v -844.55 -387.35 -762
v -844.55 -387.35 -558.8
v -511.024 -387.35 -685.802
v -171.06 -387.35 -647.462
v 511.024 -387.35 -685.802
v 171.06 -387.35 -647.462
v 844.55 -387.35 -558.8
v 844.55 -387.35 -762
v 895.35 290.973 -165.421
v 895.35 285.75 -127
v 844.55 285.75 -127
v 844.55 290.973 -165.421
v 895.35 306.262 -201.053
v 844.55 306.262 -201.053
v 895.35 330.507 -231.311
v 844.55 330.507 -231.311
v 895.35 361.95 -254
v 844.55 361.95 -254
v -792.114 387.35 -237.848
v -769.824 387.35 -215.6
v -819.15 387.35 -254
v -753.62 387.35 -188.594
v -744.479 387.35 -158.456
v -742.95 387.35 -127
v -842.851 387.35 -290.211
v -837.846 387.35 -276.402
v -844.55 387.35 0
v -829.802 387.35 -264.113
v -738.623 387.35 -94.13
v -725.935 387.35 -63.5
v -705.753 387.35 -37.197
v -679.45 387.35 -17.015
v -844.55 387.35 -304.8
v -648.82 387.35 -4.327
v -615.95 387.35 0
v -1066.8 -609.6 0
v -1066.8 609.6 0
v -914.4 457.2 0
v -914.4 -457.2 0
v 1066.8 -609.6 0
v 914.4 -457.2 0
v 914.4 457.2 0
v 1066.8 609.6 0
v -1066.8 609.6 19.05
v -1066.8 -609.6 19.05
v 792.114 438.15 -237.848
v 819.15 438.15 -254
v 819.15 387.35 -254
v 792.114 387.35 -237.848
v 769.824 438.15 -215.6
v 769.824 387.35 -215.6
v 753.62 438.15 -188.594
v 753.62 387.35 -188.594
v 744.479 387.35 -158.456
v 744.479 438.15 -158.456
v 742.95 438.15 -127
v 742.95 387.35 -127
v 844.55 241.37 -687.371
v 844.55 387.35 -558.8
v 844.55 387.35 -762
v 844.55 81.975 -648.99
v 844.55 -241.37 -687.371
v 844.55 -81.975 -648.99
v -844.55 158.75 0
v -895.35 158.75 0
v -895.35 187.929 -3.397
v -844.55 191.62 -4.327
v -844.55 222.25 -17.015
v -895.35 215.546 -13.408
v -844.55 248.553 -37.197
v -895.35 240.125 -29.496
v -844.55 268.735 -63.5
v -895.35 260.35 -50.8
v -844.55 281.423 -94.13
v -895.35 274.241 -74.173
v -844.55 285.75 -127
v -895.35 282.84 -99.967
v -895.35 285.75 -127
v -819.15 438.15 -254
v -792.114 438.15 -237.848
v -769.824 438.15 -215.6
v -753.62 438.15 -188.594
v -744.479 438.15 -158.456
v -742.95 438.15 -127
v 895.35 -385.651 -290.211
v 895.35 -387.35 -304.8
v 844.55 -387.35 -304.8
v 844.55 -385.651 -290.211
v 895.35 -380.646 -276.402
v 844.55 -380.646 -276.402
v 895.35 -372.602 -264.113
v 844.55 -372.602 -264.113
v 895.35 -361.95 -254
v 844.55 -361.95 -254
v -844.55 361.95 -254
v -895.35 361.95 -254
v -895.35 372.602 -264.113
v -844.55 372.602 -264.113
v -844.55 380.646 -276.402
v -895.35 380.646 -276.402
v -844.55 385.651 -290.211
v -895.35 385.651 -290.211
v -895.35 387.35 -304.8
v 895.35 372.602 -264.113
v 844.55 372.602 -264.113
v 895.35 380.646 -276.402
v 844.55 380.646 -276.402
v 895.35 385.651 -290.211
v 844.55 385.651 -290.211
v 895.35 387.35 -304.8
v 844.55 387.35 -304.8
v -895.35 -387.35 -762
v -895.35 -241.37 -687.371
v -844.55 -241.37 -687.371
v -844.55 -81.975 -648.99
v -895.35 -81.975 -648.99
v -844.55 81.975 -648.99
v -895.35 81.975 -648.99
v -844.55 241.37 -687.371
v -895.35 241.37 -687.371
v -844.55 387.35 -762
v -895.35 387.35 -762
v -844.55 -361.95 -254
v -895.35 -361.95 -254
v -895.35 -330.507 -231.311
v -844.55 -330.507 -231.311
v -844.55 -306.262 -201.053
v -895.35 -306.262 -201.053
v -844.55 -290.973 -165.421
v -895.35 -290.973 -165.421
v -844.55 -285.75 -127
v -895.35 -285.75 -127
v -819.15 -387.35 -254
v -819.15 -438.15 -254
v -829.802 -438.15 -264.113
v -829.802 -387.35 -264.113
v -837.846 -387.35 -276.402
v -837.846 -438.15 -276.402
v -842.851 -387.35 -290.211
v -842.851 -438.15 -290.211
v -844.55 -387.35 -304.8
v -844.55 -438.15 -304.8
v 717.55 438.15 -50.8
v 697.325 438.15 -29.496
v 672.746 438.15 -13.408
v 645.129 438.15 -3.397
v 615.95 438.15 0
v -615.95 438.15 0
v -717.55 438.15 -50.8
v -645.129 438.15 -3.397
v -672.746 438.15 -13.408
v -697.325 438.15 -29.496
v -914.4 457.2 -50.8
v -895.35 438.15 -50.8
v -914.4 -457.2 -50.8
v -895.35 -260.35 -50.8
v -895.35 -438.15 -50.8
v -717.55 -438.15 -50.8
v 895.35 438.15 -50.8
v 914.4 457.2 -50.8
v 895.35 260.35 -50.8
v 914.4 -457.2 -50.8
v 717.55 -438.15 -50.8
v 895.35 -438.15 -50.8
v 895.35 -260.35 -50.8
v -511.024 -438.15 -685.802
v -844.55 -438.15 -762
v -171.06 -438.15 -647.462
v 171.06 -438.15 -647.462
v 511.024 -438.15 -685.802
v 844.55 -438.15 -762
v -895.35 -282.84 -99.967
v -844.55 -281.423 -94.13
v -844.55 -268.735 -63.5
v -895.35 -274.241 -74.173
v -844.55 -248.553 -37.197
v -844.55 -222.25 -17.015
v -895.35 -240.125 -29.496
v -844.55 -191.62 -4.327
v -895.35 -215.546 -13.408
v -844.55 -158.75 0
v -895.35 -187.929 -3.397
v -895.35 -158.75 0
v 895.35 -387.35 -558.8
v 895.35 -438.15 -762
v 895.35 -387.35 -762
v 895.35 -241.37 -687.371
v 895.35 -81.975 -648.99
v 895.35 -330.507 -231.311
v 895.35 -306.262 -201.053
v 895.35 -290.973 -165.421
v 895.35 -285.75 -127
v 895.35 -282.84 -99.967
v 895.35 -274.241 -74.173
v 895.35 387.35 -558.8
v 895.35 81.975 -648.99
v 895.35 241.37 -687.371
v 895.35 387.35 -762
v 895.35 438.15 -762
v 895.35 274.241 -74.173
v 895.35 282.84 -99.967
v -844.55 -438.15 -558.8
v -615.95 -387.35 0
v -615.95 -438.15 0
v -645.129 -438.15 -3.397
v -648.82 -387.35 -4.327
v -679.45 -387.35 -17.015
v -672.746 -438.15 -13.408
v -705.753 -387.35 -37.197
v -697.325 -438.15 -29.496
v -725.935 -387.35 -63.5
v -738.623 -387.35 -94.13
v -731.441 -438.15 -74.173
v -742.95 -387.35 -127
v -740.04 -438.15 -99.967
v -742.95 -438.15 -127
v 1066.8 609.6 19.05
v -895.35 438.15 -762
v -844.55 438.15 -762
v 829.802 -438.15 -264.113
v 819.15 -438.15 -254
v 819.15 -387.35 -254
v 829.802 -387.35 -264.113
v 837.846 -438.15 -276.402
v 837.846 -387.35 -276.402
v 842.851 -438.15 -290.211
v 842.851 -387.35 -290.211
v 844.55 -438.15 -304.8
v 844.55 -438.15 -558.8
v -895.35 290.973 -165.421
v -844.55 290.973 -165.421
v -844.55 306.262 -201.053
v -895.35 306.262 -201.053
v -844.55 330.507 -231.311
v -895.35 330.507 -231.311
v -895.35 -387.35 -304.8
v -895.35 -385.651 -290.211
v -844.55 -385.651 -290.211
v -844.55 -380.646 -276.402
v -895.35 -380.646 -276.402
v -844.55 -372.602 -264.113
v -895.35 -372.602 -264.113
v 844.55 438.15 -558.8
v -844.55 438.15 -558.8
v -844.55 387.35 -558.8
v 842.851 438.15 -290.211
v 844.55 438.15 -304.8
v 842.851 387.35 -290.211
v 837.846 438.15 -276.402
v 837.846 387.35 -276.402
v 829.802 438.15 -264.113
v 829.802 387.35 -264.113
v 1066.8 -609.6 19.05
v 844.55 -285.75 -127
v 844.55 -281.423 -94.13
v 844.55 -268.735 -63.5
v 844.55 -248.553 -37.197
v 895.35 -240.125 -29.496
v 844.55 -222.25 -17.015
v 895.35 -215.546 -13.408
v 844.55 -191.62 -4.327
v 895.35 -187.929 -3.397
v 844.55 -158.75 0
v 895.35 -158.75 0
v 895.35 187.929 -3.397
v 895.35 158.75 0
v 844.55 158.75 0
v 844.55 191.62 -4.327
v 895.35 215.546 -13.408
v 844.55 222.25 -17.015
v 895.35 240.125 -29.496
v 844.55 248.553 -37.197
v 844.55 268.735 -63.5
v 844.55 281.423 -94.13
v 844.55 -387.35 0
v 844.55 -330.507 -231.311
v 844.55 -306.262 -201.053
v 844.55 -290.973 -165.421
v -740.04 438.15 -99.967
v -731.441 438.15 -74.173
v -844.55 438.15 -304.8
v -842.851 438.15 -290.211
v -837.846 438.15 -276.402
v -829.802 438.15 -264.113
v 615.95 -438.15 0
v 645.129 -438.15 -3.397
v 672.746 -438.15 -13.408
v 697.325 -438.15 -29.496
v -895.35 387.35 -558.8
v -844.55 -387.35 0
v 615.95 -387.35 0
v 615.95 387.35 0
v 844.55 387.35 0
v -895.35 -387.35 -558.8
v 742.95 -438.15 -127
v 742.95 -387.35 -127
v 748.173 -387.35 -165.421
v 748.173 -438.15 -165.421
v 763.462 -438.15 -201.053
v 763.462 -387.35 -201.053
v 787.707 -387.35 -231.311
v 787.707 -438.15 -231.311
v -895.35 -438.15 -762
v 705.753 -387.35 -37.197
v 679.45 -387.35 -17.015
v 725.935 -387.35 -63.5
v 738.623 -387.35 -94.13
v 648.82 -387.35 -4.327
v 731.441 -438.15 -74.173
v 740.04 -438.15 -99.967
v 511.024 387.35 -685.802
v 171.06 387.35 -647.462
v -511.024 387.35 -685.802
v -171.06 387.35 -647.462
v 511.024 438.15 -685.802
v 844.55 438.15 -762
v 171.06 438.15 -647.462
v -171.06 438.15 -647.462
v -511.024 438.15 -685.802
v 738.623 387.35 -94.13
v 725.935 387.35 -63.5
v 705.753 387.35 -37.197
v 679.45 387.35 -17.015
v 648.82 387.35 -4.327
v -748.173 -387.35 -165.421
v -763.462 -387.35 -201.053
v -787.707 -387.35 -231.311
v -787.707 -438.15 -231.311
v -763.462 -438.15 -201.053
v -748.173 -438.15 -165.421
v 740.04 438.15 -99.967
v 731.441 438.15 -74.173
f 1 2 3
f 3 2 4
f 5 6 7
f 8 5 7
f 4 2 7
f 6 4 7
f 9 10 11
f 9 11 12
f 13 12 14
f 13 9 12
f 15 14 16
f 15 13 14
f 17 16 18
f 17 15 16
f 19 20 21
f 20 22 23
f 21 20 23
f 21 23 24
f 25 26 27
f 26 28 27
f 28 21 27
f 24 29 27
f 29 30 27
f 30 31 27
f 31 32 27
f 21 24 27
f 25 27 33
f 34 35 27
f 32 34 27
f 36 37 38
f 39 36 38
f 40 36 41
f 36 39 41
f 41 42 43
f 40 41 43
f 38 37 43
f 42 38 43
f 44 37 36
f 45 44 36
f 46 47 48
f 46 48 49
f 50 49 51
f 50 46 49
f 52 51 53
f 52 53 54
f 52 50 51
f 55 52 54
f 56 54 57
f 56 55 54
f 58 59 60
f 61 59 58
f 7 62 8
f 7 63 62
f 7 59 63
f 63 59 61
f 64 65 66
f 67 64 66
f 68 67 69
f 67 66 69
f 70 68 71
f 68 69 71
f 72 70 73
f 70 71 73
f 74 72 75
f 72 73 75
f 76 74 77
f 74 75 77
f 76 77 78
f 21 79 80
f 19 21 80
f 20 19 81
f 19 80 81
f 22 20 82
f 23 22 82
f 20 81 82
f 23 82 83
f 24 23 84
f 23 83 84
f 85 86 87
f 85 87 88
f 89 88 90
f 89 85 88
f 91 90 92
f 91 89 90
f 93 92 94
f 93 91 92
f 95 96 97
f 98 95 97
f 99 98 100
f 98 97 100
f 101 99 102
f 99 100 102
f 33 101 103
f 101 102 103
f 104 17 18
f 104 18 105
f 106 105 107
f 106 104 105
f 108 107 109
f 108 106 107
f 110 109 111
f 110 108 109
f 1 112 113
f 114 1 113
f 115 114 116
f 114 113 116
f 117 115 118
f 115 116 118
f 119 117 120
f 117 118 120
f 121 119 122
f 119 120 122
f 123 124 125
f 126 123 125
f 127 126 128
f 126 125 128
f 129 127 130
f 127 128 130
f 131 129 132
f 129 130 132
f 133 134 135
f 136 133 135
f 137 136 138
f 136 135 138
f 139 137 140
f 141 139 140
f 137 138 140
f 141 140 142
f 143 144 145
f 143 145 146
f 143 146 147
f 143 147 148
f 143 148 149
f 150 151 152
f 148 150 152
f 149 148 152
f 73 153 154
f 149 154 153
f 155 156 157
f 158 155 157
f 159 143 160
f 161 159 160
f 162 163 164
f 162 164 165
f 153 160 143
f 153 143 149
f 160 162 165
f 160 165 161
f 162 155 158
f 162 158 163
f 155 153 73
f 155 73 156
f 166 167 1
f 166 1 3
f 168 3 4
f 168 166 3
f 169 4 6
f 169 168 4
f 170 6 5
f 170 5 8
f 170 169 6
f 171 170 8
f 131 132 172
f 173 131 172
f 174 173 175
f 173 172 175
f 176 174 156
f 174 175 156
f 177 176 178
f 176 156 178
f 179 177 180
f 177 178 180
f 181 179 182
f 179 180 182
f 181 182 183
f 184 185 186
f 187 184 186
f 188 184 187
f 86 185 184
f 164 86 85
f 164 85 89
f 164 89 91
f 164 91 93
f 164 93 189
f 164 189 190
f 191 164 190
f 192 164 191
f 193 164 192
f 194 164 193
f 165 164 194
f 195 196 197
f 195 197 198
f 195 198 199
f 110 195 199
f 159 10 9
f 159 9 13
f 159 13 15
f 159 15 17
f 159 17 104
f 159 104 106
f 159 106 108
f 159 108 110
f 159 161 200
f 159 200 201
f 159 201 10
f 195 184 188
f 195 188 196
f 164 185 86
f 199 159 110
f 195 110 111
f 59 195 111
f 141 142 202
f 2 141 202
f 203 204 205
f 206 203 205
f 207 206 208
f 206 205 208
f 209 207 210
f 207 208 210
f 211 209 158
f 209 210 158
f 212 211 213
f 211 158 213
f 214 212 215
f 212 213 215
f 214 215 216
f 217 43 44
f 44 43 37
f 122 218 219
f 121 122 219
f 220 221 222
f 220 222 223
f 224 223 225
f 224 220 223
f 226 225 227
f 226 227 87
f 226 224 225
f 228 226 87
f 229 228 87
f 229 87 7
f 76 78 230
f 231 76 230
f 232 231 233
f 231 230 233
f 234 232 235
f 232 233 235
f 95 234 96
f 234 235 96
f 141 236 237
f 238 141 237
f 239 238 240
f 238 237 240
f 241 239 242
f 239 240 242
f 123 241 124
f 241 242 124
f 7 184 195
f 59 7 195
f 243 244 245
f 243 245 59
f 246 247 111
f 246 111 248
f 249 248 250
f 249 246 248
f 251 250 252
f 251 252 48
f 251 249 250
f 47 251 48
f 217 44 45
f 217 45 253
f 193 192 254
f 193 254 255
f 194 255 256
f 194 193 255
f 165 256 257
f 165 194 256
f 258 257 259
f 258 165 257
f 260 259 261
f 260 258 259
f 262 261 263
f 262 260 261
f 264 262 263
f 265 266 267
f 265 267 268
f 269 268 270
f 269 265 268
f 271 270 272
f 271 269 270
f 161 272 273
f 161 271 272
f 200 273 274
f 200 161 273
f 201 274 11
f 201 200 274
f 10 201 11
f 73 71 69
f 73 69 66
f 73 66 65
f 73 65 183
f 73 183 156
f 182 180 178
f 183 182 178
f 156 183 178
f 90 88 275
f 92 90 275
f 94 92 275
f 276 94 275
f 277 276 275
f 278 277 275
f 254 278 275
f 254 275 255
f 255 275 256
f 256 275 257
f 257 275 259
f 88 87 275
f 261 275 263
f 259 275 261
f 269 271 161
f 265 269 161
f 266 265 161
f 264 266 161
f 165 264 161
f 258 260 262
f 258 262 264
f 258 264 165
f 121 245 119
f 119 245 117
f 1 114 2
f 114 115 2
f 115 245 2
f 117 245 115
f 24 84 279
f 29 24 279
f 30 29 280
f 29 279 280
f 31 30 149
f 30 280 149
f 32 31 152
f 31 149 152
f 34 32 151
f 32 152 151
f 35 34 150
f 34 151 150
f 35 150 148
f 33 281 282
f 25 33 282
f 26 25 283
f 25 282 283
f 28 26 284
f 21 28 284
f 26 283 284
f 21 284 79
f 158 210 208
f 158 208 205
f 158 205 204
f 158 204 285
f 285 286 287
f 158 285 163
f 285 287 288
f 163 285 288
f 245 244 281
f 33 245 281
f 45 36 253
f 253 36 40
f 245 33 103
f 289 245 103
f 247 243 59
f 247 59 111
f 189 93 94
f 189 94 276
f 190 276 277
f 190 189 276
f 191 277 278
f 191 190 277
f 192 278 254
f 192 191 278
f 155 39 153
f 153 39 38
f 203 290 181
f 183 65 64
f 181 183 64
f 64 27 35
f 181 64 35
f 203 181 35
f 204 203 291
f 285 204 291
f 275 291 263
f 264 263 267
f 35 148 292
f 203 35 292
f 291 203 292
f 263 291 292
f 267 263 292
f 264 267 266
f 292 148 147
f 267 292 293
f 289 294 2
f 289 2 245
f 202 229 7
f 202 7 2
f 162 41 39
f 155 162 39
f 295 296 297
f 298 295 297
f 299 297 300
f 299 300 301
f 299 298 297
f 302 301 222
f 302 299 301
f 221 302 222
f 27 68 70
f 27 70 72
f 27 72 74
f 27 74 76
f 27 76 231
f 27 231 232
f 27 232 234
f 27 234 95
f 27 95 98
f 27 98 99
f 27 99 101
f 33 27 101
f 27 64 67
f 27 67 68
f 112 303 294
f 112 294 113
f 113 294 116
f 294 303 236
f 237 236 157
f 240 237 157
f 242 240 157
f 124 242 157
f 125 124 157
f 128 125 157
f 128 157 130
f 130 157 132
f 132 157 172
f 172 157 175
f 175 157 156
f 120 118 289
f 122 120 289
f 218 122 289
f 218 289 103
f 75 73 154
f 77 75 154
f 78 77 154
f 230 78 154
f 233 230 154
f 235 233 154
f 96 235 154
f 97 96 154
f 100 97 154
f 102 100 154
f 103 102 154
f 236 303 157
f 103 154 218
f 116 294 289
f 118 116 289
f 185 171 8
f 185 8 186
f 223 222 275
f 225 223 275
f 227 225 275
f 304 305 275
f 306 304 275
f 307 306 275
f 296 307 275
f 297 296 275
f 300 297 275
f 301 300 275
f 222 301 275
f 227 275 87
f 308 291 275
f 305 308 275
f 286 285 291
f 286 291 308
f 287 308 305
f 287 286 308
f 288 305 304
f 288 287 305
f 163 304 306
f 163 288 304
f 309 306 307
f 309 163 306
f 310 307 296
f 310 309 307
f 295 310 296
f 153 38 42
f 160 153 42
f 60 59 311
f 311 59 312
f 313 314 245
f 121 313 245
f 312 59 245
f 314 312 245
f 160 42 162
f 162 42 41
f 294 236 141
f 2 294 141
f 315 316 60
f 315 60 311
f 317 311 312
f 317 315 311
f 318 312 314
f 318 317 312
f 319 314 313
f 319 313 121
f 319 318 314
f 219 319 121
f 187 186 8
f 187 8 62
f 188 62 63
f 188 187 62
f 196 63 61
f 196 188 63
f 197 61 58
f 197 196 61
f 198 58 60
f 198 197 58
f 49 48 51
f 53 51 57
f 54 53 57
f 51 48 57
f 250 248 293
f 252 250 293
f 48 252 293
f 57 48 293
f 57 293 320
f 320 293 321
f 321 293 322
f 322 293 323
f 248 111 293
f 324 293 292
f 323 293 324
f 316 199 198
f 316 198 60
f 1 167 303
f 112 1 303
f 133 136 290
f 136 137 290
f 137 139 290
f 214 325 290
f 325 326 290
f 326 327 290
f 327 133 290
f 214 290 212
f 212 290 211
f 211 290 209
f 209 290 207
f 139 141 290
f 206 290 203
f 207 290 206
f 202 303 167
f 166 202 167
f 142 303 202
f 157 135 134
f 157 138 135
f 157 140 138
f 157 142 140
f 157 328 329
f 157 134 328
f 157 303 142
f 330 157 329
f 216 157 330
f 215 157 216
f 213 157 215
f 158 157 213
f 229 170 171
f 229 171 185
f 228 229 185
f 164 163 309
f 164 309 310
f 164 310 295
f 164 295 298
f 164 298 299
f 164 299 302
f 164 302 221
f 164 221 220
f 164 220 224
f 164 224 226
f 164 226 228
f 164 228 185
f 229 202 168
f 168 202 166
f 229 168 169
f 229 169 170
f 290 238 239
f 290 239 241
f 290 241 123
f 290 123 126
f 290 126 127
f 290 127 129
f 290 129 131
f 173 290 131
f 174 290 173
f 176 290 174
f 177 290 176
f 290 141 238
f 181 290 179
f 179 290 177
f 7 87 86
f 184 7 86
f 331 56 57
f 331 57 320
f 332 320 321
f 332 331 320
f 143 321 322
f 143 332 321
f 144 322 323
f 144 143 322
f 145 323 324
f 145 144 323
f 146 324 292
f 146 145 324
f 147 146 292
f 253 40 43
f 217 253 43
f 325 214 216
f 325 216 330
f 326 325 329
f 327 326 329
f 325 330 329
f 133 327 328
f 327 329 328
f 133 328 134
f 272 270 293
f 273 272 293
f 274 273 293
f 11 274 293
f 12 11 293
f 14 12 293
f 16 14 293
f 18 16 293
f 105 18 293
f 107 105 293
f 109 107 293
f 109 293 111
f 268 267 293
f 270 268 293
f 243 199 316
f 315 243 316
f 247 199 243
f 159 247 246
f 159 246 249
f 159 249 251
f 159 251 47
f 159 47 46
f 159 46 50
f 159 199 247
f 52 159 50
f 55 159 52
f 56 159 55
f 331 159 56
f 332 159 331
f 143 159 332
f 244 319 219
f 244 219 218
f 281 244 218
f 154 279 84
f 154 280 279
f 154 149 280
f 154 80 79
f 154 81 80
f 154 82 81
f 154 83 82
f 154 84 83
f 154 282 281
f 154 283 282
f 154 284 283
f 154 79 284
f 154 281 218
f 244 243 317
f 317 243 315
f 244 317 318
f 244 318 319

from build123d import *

# Parameters (mm, degrees)
F0_W      = 2057.4
F0_H      = 1143
F1_DEPTH  = 19.05
F3_DEPTH  = 50.8
F5_DEPTH  = 50.8
F7_DEPTH  = 50.8
F10_DEPTH = 50.8
F12_DEPTH = 50.8
F14_DEPTH = 50.8
F16_DEPTH = 50.8
F18_DEPTH = 50.8


with BuildPart() as f1:
    # F0 (on Top) → F1 (new body)
    with BuildSketch(Plane.XY):
        Polygon((1066.8, 609.6), (0, 609.6), (-1066.8, 609.6), (-1066.8, -609.6), (-1028.7, -609.6), (1066.8, -609.6), align=None)
        Rectangle(F0_W, F0_H, mode=Mode.SUBTRACT)
        Rectangle(F0_W, F0_H)
    extrude(amount=F1_DEPTH)

    # F2 (on face) → F3 (join)
    with BuildSketch(Plane(origin=(0, 0, 0), x_dir=(1, 0, 0), z_dir=(0, 0, -1))):
        Polygon((-914.4, -457.2), (0, -457.2), (914.4, -457.2), (914.4, 457.2), (0, 457.2), (-914.4, 457.2), align=None)
        Polygon((895.35, -438.15), (0, -438.15), (-895.35, -438.15), (-895.35, 438.15), (0, 438.15), (895.35, 438.15), align=None, mode=Mode.SUBTRACT)
    extrude(amount=F3_DEPTH)

    # F4 (on face) → F5 (join)
    with BuildSketch(Plane(origin=(0, -438.15, 0), x_dir=(-1, 0, 0), z_dir=(0, 1, 0))):
        with BuildLine():
            Line((895.35, -762), (895.35, 0))
            Line((895.35, 0), (742.95, 0))
            Line((742.95, 0), (615.95, 0))
            ThreePointArc((615.95, 0), (705.7525612107, -37.1974387893), (742.95, -127))
            ThreePointArc((742.95, -127), (763.4615182258, -201.0530890645), (819.15, -254))
            ThreePointArc((819.15, -254), (837.8461266285, -276.4019366858), (844.55, -304.8))
            Line((844.55, -304.8), (844.55, -762))
            Line((844.55, -762), (895.35, -762))
        make_face()
    extrude(amount=F5_DEPTH)

    # F6 (on face) → F7 (join)
    with BuildSketch(Plane.XZ.offset(-438.15)):
        with BuildLine():
            Line((-742.95, 0), (-895.35, 0))
            Line((-895.35, 0), (-895.35, -127))
            Line((-895.35, -127), (-895.35, -203.2))
            Line((-895.35, -203.2), (-895.35, -762))
            Line((-895.35, -762), (-844.55, -762))
            Line((-844.55, -762), (-844.55, -304.8))
            ThreePointArc((-844.55, -304.8), (-837.8461266285, -276.4019366858), (-819.15, -254))
            ThreePointArc((-819.15, -254), (-760.8906614316, -202.595603141), (-742.95, -127))
            ThreePointArc((-742.95, -127), (-705.7525612107, -37.1974387893), (-615.95, 0))
            Line((-615.95, 0), (-742.95, 0))
        make_face()
    extrude(amount=F7_DEPTH)

    # F8: F1 across plane


with BuildPart() as f1_1:
    add(f1.part)
    add(f1.part.mirror(Plane.YZ))

    # F9 (on face) → F10 (join)
    with BuildSketch(Plane.XZ.offset(438.15)):
        with BuildLine():
            Line((-844.55, -558.8), (-844.55, -762))
            ThreePointArc((-844.55, -762), (0, -642.6582759858), (844.55, -762))
            Line((844.55, -762), (844.55, -558.8))
            Line((844.55, -558.8), (-844.55, -558.8))
        make_face()
    extrude(amount=-F10_DEPTH)

    # F11 (on face) → F12 (join)
    with BuildSketch(Plane(origin=(0, 438.15, 0), x_dir=(-1, 0, 0), z_dir=(0, 1, 0))):
        with BuildLine():
            ThreePointArc((-844.55, -762), (0, -642.6582759858), (844.55, -762))
            Line((844.55, -762), (844.55, -558.8))
            Line((844.55, -558.8), (-844.55, -558.8))
            Line((-844.55, -558.8), (-844.55, -762))
        make_face()
    extrude(amount=-F12_DEPTH)

    # F13 (on face) → F14 (join)
    with BuildSketch(Plane.YZ.offset(-895.35)):
        with BuildLine():
            Line((-387.35, -560.2836336464), (-387.35, -762))
            ThreePointArc((-387.35, -762), (0, -644.1417336464), (387.35, -762))
            Line((387.35, -762), (387.35, -560.2836336464))
            Line((387.35, -560.2836336464), (-387.35, -560.2836336464))
        make_face()
    extrude(amount=F14_DEPTH)

    # F15 (on face) → F16 (join)
    with BuildSketch(Plane(origin=(895.35, 0, 0), x_dir=(0, -1, 0), z_dir=(-1, 0, 0))):
        with BuildLine():
            Line((-387.35, -558.8), (-387.35, -762))
            ThreePointArc((-387.35, -762), (0, -642.6581), (387.35, -762))
            Line((387.35, -762), (387.35, -558.8))
            Line((387.35, -558.8), (-387.35, -558.8))
        make_face()
    extrude(amount=F16_DEPTH)

    # F17 (on face) → F18 (join)
    with BuildSketch(Plane.YZ.offset(-895.35)):
        with BuildLine():
            Line((387.35, -304.8), (387.35, 0))
            Line((387.35, 0), (158.75, 0))
            ThreePointArc((158.75, 0), (248.5525612107, -37.1974387893), (285.75, -127))
            ThreePointArc((285.75, -127), (306.2615182258, -201.0530890645), (361.95, -254))
            ThreePointArc((361.95, -254), (380.6461266285, -276.4019366858), (387.35, -304.8))
        make_face()
        with BuildLine():
            Line((-387.35, 0), (-387.35, -304.8))
            ThreePointArc((-387.35, -304.8), (-380.6461266285, -276.4019366858), (-361.95, -254))
            ThreePointArc((-361.95, -254), (-306.2615182258, -201.0530890645), (-285.75, -127))
            ThreePointArc((-285.75, -127), (-248.5525612107, -37.1974387893), (-158.75, 0))
            Line((-158.75, 0), (-387.35, 0))
        make_face()
    extrude(amount=F18_DEPTH)

    # F19: F1 across plane


with BuildPart() as f1_2:
    add(f1_1.part)
    add(f1_1.part.mirror(Plane.YZ))


solid = f1_2.part
